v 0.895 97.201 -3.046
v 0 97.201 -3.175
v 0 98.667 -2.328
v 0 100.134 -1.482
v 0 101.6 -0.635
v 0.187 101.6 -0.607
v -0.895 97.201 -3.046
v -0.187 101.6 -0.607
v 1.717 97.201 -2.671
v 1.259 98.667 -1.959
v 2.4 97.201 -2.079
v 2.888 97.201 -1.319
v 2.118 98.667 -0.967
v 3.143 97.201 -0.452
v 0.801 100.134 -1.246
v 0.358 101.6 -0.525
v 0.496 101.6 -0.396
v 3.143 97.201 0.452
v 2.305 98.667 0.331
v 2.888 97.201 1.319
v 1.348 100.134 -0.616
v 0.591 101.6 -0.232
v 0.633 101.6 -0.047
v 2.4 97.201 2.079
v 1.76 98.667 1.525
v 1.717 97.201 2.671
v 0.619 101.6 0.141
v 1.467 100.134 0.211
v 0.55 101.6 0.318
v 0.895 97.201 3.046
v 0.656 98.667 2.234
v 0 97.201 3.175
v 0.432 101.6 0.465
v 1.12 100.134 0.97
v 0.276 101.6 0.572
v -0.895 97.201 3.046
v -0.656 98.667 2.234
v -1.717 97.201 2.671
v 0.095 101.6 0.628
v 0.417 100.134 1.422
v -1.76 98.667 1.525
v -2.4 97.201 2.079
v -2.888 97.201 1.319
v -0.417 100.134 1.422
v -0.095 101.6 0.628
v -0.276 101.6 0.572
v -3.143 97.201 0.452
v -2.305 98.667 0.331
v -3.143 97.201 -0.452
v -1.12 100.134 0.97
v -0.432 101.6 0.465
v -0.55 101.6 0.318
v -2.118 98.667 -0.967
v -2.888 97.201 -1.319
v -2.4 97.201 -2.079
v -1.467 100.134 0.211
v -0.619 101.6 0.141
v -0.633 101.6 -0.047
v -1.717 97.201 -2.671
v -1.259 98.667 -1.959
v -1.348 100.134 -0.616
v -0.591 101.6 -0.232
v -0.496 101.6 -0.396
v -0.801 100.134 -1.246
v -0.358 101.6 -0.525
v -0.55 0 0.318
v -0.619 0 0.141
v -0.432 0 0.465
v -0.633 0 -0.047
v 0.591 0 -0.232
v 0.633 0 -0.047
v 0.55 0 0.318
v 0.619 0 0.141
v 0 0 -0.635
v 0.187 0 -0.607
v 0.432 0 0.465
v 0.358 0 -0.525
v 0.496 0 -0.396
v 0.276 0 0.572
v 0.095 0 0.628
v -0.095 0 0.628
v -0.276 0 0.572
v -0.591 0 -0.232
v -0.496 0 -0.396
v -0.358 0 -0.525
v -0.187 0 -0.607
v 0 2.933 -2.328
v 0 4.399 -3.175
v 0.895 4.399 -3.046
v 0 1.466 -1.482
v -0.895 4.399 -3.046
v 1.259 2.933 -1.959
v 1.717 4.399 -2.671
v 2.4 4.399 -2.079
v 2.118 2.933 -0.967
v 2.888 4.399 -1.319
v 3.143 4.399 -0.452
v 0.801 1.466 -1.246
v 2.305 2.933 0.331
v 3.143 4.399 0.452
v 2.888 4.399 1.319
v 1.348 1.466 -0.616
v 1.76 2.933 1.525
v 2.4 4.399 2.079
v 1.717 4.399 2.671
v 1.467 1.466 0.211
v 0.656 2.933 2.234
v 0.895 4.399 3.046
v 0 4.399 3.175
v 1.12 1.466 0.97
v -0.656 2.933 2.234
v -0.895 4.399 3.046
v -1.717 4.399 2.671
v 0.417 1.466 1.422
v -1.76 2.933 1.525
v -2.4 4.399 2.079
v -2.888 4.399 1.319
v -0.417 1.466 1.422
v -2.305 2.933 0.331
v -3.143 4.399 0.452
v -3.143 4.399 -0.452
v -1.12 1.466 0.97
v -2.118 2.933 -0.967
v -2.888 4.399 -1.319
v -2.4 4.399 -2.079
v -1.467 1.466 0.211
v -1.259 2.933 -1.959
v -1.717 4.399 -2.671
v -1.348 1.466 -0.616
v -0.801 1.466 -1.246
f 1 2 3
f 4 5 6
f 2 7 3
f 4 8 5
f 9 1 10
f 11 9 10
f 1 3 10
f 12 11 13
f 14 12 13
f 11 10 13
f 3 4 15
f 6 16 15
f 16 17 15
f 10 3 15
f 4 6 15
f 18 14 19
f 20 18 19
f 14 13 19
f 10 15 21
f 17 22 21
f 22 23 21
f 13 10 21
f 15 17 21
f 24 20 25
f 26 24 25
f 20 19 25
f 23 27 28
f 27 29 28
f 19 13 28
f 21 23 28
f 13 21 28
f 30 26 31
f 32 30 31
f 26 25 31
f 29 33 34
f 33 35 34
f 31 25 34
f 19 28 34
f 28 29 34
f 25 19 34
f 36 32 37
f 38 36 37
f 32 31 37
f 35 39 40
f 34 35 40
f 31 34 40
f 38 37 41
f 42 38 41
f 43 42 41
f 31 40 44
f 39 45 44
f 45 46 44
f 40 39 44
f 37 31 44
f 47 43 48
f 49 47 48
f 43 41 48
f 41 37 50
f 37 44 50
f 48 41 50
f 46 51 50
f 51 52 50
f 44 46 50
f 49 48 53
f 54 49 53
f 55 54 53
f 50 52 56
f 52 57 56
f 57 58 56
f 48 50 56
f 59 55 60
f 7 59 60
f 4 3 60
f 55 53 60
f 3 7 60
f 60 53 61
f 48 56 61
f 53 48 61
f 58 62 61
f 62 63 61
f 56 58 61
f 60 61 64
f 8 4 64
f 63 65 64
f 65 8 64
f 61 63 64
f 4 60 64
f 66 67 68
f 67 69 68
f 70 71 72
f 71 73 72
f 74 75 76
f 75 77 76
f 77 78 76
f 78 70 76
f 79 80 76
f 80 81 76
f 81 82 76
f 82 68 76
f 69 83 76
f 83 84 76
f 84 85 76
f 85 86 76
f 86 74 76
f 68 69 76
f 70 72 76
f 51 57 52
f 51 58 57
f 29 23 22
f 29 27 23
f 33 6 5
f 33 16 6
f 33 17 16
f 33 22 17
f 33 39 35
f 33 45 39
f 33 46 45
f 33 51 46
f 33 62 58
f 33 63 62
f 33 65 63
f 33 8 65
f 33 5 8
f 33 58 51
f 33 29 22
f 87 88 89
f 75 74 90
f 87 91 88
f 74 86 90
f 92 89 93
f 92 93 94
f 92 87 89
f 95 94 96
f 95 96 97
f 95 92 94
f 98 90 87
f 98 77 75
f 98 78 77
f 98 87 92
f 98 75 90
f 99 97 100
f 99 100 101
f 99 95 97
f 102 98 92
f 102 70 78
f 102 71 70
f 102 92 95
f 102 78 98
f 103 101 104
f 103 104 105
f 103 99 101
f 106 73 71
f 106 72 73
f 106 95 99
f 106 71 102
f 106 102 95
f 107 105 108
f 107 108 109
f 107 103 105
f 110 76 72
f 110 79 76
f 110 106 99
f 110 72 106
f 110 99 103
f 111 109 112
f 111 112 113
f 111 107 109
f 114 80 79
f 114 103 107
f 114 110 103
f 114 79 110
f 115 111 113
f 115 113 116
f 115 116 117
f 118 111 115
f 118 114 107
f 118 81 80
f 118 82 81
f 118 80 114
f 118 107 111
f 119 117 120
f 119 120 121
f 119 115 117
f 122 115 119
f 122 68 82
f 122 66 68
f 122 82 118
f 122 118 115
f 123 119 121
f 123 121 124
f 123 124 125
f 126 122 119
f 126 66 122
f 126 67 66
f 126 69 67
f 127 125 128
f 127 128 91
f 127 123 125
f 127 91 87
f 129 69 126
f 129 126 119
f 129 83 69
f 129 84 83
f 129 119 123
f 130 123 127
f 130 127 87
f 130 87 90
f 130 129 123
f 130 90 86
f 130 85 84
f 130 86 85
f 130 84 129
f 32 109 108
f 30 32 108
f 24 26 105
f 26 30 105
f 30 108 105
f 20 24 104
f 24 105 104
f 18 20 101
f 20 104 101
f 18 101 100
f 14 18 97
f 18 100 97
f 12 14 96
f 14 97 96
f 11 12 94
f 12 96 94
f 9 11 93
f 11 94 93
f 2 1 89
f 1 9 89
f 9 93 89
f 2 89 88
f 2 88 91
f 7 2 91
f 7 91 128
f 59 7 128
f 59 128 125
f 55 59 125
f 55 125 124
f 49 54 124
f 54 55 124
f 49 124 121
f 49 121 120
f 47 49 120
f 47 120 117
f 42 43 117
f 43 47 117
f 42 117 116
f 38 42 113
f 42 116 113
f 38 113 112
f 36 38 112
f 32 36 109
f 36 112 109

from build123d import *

# Parameters (mm, degrees)
SKETCH1_R           = 3.175
BOSS_EXTRUDE1_DEPTH = 101.6


with BuildPart() as part:
    # Sketch1 → Boss-Extrude1 (new body)
    with BuildSketch(Plane(origin=(0, 0, 0), x_dir=(1, 0, 0), z_dir=(0, 1, 0))):
        with Locations(Location((0, 0, 0), (0, 0, 270))):
            Circle(SKETCH1_R)
    extrude(amount=BOSS_EXTRUDE1_DEPTH)

    # Sketch3 → Cut-Revolve2 (revolve, cut)
    with BuildSketch(Plane.XY, mode=Mode.PRIVATE) as cut_revolve2_sk:
        Polygon((3.175, 97.200590949), (0.635, 101.6), (3.175, 101.6), align=None)
    cut_revolve2 = revolve(cut_revolve2_sk.sketch.rotate(Axis((0, 101.6, 0), (0, -1, 0)), 270), axis=Axis((0, 101.6, 0), (0, -1, 0)), mode=Mode.SUBTRACT)

    # Mirror1: Cut-Revolve2 across plane
    add(cut_revolve2.mirror(Plane.ZX.offset(50.8)), mode=Mode.SUBTRACT)


solid = part.part
